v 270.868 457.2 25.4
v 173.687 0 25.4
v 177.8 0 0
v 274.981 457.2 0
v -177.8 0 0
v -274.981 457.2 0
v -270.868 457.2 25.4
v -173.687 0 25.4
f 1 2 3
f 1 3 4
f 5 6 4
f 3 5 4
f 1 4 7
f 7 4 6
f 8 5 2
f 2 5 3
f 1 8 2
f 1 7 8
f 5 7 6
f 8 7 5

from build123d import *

# Parameters (mm, degrees)
F2_DEPTH   = 25.4
F3_SIZE2   = 4.022955
F3_SIZE    = 25.39999
F3_2_SIZE2 = 4.022955
F3_2_SIZE  = 25.39999


# Not quite as in the source:
# - a fillet or chamfer is up to 0.001 mm smaller than in the source, because OpenCascade refuses the exact size


with BuildPart() as f2:
    # F1 (on Top) → F2 (new body)
    with BuildSketch(Plane.XY):
        Polygon((-274.9808599955, 457.2), (-177.8, 0), (177.8, 0), (274.9808599955, 457.2), align=None)
    extrude(amount=F2_DEPTH)

    # F3 (size 25.4 and 4.0229647842 in the source; OpenCascade refuses exactly that, so slightly less here)
    f3_edges = [f2.edges().sort_by_distance(p)[0] for p in [
        (-226.39043, 228.6, 25.4),
    ]]
    f3_side = f2.faces().sort_by_distance((-226.39043, 228.6, 12.7))[0]
    chamfer(f3_edges, length=F3_SIZE, length2=F3_SIZE2, reference=f3_side)

    # F3#2 (size 25.4 and 4.0229647842 in the source; OpenCascade refuses exactly that, so slightly less here)
    f3_2_edges = [f2.edges().sort_by_distance(p)[0] for p in [
        (226.39043, 228.6, 25.4),
    ]]
    f3_2_side = f2.faces().sort_by_distance((226.39043, 228.6, 12.7))[0]
    chamfer(f3_2_edges, length=F3_2_SIZE, length2=F3_2_SIZE2, reference=f3_2_side)


solid = f2.part
